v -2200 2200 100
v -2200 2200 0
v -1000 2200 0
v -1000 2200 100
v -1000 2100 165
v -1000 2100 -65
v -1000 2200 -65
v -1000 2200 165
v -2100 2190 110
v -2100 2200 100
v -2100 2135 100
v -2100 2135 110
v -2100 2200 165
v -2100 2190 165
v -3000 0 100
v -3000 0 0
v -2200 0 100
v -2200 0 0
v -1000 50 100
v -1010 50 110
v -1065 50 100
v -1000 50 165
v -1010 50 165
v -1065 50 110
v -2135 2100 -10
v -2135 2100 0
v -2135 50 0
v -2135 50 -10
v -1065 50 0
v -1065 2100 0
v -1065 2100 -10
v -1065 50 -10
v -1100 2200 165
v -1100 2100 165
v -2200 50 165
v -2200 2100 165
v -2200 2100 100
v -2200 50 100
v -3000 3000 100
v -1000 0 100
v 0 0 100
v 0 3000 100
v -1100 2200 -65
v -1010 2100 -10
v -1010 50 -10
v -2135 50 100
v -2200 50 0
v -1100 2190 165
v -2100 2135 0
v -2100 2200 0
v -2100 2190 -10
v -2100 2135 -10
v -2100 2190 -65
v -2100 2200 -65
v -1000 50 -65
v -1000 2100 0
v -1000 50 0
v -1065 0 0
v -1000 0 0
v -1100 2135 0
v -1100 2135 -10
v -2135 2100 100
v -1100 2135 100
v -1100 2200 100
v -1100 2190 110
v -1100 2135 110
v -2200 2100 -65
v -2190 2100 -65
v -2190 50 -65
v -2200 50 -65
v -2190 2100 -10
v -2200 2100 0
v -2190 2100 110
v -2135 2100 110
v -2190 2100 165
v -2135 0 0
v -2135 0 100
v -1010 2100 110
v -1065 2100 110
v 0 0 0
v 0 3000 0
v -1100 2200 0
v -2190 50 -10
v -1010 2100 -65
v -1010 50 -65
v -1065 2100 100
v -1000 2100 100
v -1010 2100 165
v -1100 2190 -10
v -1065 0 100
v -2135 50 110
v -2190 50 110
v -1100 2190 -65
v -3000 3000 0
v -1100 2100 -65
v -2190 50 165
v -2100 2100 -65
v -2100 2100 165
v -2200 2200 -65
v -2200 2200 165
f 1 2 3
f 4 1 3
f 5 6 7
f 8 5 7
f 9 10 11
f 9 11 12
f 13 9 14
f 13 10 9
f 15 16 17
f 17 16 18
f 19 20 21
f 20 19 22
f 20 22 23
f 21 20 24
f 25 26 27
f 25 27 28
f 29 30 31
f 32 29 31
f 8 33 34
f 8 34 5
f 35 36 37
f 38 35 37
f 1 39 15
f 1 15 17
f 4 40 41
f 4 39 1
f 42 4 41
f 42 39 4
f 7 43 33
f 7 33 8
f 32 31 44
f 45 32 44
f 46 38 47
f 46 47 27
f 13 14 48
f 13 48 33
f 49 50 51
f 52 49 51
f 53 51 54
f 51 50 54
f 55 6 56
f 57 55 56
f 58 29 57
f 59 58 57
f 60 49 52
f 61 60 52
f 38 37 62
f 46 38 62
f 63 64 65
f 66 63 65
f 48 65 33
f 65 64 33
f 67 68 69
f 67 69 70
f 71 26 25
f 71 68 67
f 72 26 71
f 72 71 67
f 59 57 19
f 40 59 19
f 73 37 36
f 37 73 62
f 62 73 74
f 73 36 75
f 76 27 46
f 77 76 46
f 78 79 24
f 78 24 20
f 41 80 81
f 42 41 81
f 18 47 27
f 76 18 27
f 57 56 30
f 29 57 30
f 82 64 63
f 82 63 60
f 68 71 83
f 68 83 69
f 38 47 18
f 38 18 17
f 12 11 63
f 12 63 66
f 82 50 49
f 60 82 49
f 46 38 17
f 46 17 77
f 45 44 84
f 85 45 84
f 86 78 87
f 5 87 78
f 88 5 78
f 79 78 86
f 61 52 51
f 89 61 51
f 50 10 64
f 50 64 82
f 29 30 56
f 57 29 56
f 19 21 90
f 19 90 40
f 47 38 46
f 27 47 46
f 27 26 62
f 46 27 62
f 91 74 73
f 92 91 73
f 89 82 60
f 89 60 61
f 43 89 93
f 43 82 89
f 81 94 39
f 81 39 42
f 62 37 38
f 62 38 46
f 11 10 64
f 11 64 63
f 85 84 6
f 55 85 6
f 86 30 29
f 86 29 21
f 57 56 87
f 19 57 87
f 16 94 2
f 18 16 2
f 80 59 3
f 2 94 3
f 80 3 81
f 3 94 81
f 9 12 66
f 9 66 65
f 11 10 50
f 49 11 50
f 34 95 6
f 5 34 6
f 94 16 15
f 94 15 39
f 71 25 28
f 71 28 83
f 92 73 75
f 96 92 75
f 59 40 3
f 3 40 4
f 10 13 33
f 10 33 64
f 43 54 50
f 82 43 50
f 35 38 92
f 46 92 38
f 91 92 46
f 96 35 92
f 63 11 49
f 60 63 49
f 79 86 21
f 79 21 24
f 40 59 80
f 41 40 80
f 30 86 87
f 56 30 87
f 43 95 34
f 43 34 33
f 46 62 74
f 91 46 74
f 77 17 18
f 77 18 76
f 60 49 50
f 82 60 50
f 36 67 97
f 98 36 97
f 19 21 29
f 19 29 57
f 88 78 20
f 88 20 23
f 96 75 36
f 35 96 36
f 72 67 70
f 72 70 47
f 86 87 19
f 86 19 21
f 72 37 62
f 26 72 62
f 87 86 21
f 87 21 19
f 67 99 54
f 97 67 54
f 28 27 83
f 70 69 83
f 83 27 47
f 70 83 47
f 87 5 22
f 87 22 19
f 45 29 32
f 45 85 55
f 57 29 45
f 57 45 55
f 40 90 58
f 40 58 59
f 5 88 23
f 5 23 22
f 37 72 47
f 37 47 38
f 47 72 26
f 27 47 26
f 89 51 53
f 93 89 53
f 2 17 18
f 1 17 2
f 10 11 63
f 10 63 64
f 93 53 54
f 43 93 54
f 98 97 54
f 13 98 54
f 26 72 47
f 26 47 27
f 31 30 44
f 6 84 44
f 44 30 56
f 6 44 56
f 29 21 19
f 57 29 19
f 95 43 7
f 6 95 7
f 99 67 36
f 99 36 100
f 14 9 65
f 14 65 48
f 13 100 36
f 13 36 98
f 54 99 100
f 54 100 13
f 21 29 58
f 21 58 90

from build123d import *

# Parameters (mm, degrees)
SKETCH1_W                   = 3000
SKETCH1_H                   = 3000
SKETCH1_W_2                 = 1200
SKETCH1_H_2                 = 900
BOSS_EXTRUDE1_DEPTH         = 100
BOSS_EXTRUDE19_DEPTH        = 65
BOSS_EXTRUDE19_DEPTH_BACK   = 165
SKETCH19_W                  = 100
SKETCH19_H                  = 100
BOSS_EXTRUDE19_2_DEPTH      = 65
BOSS_EXTRUDE19_2_DEPTH_BACK = 165
BOSS_EXTRUDE22_DEPTH        = 2050
BOSS_EXTRUDE22_2_DEPTH      = 2050
BOSS_EXTRUDE22_3_DEPTH      = 2050
BOSS_EXTRUDE22_4_DEPTH      = 2050
BOSS_EXTRUDE24_DEPTH        = 1000
BOSS_EXTRUDE24_2_DEPTH      = 1000
SKETCH23_W                  = 65
SKETCH23_H                  = 100
BOSS_EXTRUDE25_DEPTH        = 2050
BOSS_EXTRUDE25_2_DEPTH      = 2050
SKETCH24_W                  = 1200
SKETCH24_H                  = 1300
CUT_EXTRUDE1_DEPTH          = 4246.847971843
SKETCH25_W                  = 65
SKETCH25_H                  = 100
BOSS_EXTRUDE26_DEPTH        = 50
BOSS_EXTRUDE26_2_DEPTH      = 50
SKETCH26_W                  = 100
SKETCH26_H                  = 65
BOSS_EXTRUDE27_DEPTH        = 1000


with BuildPart() as part:
    # Sketch1 → Boss-Extrude1 (new body)
    with BuildSketch(Plane.XY):
        with Locations((-1500, 1500)):
            Rectangle(SKETCH1_W, SKETCH1_H)
        with Locations((-1600, 1750)):
            Rectangle(SKETCH1_W_2, SKETCH1_H_2, mode=Mode.SUBTRACT)
    extrude(amount=BOSS_EXTRUDE1_DEPTH)

    # Sketch24 → Cut-Extrude1 (cut, through all)
    with BuildSketch(Plane.XY.offset(100)):
        with Locations((-1600, 650)):
            Rectangle(SKETCH24_W, SKETCH24_H)
    extrude(amount=-CUT_EXTRUDE1_DEPTH, mode=Mode.SUBTRACT)


with BuildPart() as body_2:
    # Sketch19 → Boss-Extrude19 (new, two sides: drawn at the far end of the back side and taken through both)
    with BuildSketch(Plane.XY.offset(100).offset(-BOSS_EXTRUDE19_DEPTH_BACK)):
        with Locations((-2150, 2150)):
            Rectangle(SKETCH19_W, SKETCH19_H)
    extrude(amount=BOSS_EXTRUDE19_DEPTH + BOSS_EXTRUDE19_DEPTH_BACK)


with BuildPart() as body_3:
    # Sketch19 → Boss-Extrude19 2 (new, two sides: drawn at the far end of the back side and taken through both)
    with BuildSketch(Plane.XY.offset(100).offset(-BOSS_EXTRUDE19_2_DEPTH_BACK)):
        with Locations((-1050, 2150)):
            Rectangle(SKETCH19_W, SKETCH19_H)
    extrude(amount=BOSS_EXTRUDE19_2_DEPTH + BOSS_EXTRUDE19_2_DEPTH_BACK)


with BuildPart() as body_4:
    # Sketch22 → Boss-Extrude22 (new body)
    with BuildSketch(Plane.XZ.offset(-2100)):
        Polygon((-1000, 100), (-1065, 100), (-1065, 110), (-1010, 110), (-1010, 165), (-1000, 165), align=None)
    extrude(amount=BOSS_EXTRUDE22_DEPTH)


with BuildPart() as body_5:
    # Sketch22 → Boss-Extrude22 2 (new body)
    with BuildSketch(Plane.XZ.offset(-2100)):
        Polygon((-2200, 165), (-2200, 100), (-2135, 100), (-2135, 110), (-2190, 110), (-2190, 165), align=None)
    extrude(amount=BOSS_EXTRUDE22_2_DEPTH)


with BuildPart() as body_6:
    # Sketch22 → Boss-Extrude22 3 (new body)
    with BuildSketch(Plane.XZ.offset(-2100)):
        Polygon((-2200, 0), (-2135, 0), (-2135, -10), (-2190, -10), (-2190, -65), (-2200, -65), align=None)
    extrude(amount=BOSS_EXTRUDE22_3_DEPTH)


with BuildPart() as body_7:
    # Sketch22 → Boss-Extrude22 4 (new body)
    with BuildSketch(Plane.XZ.offset(-2100)):
        Polygon((-1000, -65), (-1000, 0), (-1065, 0), (-1065, -10), (-1010, -10), (-1010, -65), align=None)
    extrude(amount=BOSS_EXTRUDE22_4_DEPTH)


with BuildPart() as body_8:
    # Sketch21 → Boss-Extrude24 (new body)
    with BuildSketch(Plane(origin=(-2100, 0, 0), x_dir=(0, 0, -1), z_dir=(1, 0, 0))):
        Polygon((65, 2200), (0, 2200), (0, 2135), (10, 2135), (10, 2190), (65, 2190), align=None)
    extrude(amount=BOSS_EXTRUDE24_DEPTH)


with BuildPart() as body_9:
    # Sketch21 → Boss-Extrude24 2 (new body)
    with BuildSketch(Plane(origin=(-2100, 0, 0), x_dir=(0, 0, -1), z_dir=(1, 0, 0))):
        Polygon((-165, 2200), (-100, 2200), (-100, 2135), (-110, 2135), (-110, 2190), (-165, 2190), align=None)
    extrude(amount=BOSS_EXTRUDE24_2_DEPTH)


with BuildPart() as body_10:
    # Sketch23 → Boss-Extrude25 (new body)
    with BuildSketch(Plane(origin=(0, 2100, 300), x_dir=(1, 0, 0), z_dir=(0, -1, 0))):
        with Locations((-1032.5, -250)):
            Rectangle(SKETCH23_W, SKETCH23_H)
    extrude(amount=BOSS_EXTRUDE25_DEPTH)


with BuildPart() as body_11:
    # Sketch23 → Boss-Extrude25 2 (new body)
    with BuildSketch(Plane(origin=(0, 2100, 300), x_dir=(1, 0, 0), z_dir=(0, -1, 0))):
        with Locations((-2167.5, -250)):
            Rectangle(SKETCH23_W, SKETCH23_H)
    extrude(amount=BOSS_EXTRUDE25_2_DEPTH)


with BuildPart() as body_12:
    # Sketch25 → Boss-Extrude26 (new body)
    with BuildSketch(Plane.XZ.offset(-50)):
        with Locations((-1032.5, 50)):
            Rectangle(SKETCH25_W, SKETCH25_H)
    extrude(amount=BOSS_EXTRUDE26_DEPTH)


with BuildPart() as body_13:
    # Sketch25 → Boss-Extrude26 2 (new body)
    with BuildSketch(Plane.XZ.offset(-50)):
        with Locations((-2167.5, 50)):
            Rectangle(SKETCH25_W, SKETCH25_H)
    extrude(amount=BOSS_EXTRUDE26_2_DEPTH)


with BuildPart() as body_14:
    # Sketch26 → Boss-Extrude27 (new body)
    with BuildSketch(Plane(origin=(-2100, 0, 0), x_dir=(0, 0, -1), z_dir=(1, 0, 0))):
        with Locations((-50, 2167.5)):
            Rectangle(SKETCH26_W, SKETCH26_H)
    extrude(amount=BOSS_EXTRUDE27_DEPTH)


solid = Compound([part.part, body_2.part, body_3.part, body_4.part, body_5.part, body_6.part, body_7.part, body_8.part, body_9.part, body_10.part, body_11.part, body_12.part, body_13.part, body_14.part])
